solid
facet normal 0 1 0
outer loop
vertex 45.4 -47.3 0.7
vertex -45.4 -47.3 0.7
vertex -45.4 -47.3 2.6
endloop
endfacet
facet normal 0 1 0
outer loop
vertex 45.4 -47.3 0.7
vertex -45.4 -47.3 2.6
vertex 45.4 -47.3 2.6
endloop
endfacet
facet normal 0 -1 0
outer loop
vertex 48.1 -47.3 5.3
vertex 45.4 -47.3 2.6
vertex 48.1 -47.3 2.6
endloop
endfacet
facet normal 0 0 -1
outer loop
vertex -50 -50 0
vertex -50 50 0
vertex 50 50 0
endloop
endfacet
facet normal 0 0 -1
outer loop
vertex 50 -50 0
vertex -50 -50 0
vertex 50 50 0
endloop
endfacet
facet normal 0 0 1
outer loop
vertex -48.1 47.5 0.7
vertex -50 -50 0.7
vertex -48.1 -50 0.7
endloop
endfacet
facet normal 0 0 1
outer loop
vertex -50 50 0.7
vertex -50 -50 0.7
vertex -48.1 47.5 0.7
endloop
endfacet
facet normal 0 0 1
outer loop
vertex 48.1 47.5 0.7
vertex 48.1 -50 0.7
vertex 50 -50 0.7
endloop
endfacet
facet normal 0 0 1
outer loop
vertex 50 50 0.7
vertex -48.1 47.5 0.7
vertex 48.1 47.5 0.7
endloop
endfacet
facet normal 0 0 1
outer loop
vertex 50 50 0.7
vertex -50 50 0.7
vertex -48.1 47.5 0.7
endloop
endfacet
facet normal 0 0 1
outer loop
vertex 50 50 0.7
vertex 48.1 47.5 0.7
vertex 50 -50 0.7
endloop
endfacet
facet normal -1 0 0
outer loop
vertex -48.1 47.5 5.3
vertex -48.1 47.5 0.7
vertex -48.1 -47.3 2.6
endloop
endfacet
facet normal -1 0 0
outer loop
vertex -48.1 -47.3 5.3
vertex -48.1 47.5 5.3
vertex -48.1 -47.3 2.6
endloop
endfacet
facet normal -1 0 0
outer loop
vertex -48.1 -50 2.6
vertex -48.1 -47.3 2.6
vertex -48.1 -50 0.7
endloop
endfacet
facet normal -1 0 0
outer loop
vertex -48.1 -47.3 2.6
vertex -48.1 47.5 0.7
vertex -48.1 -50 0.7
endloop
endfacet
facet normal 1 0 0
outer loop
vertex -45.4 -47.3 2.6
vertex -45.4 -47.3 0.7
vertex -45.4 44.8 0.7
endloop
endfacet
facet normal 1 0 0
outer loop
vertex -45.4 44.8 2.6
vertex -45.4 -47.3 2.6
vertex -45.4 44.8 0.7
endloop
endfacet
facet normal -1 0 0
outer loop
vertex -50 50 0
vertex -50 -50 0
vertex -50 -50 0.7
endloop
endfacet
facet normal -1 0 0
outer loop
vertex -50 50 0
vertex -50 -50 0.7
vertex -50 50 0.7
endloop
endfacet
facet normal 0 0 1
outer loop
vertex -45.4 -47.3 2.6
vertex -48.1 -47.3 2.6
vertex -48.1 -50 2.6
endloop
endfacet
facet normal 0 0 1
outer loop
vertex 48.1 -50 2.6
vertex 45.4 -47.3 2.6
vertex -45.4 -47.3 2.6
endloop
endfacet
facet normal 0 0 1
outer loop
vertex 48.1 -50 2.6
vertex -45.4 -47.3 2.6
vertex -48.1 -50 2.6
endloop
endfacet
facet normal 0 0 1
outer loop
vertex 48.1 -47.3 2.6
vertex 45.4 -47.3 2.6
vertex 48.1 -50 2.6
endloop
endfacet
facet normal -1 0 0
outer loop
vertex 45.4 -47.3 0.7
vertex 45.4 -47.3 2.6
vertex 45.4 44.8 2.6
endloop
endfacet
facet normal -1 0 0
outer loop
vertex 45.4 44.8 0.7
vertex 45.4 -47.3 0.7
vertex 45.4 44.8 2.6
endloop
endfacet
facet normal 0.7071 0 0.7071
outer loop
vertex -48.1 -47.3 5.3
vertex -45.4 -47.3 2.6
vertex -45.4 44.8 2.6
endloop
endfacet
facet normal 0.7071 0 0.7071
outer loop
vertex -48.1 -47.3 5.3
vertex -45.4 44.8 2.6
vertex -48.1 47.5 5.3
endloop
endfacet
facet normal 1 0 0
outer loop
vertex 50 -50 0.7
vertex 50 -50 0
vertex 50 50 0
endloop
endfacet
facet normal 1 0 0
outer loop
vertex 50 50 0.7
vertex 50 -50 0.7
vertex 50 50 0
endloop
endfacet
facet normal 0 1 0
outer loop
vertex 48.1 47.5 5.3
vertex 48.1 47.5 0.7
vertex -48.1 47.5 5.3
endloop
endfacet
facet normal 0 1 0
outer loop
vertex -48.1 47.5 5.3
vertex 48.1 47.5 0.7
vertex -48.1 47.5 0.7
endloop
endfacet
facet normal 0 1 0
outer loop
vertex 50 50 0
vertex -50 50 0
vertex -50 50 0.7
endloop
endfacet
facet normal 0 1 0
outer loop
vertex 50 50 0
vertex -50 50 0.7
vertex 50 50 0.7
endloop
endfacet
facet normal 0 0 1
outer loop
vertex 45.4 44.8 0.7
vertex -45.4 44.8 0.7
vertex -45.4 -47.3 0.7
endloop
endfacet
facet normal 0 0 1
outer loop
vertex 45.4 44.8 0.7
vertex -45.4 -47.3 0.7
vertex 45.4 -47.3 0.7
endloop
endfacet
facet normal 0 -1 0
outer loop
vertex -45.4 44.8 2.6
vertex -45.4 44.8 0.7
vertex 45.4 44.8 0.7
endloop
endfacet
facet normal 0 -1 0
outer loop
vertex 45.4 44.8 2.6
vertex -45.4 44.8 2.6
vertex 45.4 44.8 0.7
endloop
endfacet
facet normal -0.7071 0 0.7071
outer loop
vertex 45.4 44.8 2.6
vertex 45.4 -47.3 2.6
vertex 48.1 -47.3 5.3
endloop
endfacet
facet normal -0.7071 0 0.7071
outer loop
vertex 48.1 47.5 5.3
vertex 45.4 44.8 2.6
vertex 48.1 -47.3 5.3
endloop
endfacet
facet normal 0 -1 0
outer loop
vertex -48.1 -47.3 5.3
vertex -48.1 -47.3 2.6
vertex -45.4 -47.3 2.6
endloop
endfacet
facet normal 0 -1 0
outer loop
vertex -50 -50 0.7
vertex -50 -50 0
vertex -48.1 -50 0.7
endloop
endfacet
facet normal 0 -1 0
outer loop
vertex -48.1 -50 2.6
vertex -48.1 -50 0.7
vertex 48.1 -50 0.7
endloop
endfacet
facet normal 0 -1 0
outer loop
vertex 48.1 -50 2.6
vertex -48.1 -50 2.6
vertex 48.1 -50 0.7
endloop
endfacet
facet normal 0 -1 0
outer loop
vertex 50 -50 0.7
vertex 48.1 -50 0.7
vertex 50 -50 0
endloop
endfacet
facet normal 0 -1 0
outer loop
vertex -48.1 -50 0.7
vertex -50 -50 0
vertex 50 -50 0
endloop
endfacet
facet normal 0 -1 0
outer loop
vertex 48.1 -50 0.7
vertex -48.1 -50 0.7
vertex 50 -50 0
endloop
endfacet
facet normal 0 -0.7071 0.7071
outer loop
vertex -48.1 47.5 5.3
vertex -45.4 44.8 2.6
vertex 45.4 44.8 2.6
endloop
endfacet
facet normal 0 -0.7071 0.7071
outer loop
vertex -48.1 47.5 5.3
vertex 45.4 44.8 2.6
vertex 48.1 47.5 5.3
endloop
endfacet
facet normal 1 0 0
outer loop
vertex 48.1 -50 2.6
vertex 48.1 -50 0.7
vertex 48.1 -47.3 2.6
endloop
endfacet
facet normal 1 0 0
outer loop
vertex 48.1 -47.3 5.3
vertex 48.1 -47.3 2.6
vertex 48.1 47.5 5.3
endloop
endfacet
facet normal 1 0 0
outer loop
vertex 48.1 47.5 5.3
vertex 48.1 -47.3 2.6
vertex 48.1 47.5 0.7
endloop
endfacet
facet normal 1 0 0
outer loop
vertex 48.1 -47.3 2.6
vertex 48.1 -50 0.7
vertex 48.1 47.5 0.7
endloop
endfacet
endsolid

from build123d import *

# Parameters (mm, degrees)
F0_W         = 100
F0_H         = 100
F1_DEPTH     = 0.7
F2_W         = 96.2
F2_H         = 97.5
F2_W_2       = 90.8
F2_H_2       = 92.1
F3_DEPTH     = 1.9
F5_DEPTH     = 3
F6_T1_DEPTH  = 90.8
F6_T3_DEPTH  = 99.8150489639
F6_T9_DEPTH  = 99.8150489639
F6_T15_DEPTH = 98.5150489639
F6_T24_DEPTH = 99.8150489639
F6_T30_DEPTH = 98.5150489639


# Not quite as in the source:
# - a fillet or chamfer that OpenCascade refuses, or shapes differently, is made with other operations: its cross-section is extruded or revolved along the edge and cut away or added


with BuildPart() as f1:
    # F0 (on Top) → F1 (new body)
    with BuildSketch(Plane.XY):
        Rectangle(F0_W, F0_H)
    extrude(amount=F1_DEPTH)

    # F2 (on face) → F3 (join)
    with BuildSketch(Plane.XY.offset(0.7)):
        with Locations((0, -1.25)):
            Rectangle(F2_W, F2_H)
        with Locations((0, -1.25)):
            Rectangle(F2_W_2, F2_H_2, mode=Mode.SUBTRACT)
    extrude(amount=F3_DEPTH)

    # F4 (on face) → F5 (join)
    with BuildSketch(Plane.XY.offset(2.6)):
        Polygon((-48.1, -47.3), (-45.4, -47.3), (-45.4, 44.8), (45.4, 44.8), (45.4, -47.3), (48.1, -47.3), (48.1, 47.5), (-48.1, 47.5), align=None)
    extrude(amount=F5_DEPTH)

    # F6: chamfer of 3 on 3 edges, made by hand

    # F6_s2 → F6_t1 (cut)
    with BuildSketch(Plane.YZ.offset(-45.4)):
        Polygon((44.8, 2.6), (47.8, 5.6), (44.8, 5.6), align=None)
    extrude(amount=F6_T1_DEPTH, mode=Mode.SUBTRACT)

    # F6_s4 → F6_t3 (cut)
    with BuildSketch(Plane.XZ.offset(-44.8)):
        Polygon((-45.4, 2.6), (-48.4, 5.6), (-45.4, 5.6), align=None)
        Polygon((45.4, 2.6), (48.4, 5.6), (45.4, 5.6), align=None)
    extrude(amount=F6_T3_DEPTH, mode=Mode.SUBTRACT)


with BuildPart() as f6_tool7:
    # F6_s8 → F6_t9 (new body)
    with BuildSketch(Plane.XZ.offset(47.3)):
        Polygon((-45.4, 2.6), (-48.4, 5.6), (-45.4, 5.6), align=None)
    extrude(amount=-F6_T9_DEPTH)

    split(bisect_by=Plane.YZ.offset(-48.1), keep=Keep.TOP)

    split(bisect_by=Plane.XZ.offset(-44.8), keep=Keep.BOTTOM)

    split(bisect_by=Plane.XZ.offset(-47.5), keep=Keep.TOP)


with BuildPart() as f6_tool13:
    # F6_s14 → F6_t15 (new body)
    with BuildSketch(Plane.YZ.offset(-53.1150489639)):
        Polygon((44.8, 2.6), (47.8, 5.6), (44.8, 5.6), align=None)
    extrude(amount=F6_T15_DEPTH)

    split(bisect_by=Plane.YZ.offset(-48.1), keep=Keep.TOP)

    split(bisect_by=Plane.YZ.offset(-45.4), keep=Keep.BOTTOM)

    split(bisect_by=Plane.XZ.offset(-47.5), keep=Keep.TOP)


with BuildPart() as f6_tool7_1:
    add(f6_tool7.part)

    # F6_t19: intersect F6_tool13
    add(f6_tool13.part, mode=Mode.INTERSECT)


with BuildPart() as f1_1:
    add(f1.part)

    # F6_t5: cut F6_tool7
    add(f6_tool7_1.part, mode=Mode.SUBTRACT)


with BuildPart() as f6_tool22:
    # F6_s23 → F6_t24 (new body)
    with BuildSketch(Plane.XZ.offset(-52.5150489639)):
        Polygon((45.4, 2.6), (48.4, 5.6), (45.4, 5.6), align=None)
    extrude(amount=F6_T24_DEPTH)

    split(bisect_by=Plane.XZ.offset(-44.8), keep=Keep.BOTTOM)

    split(bisect_by=Plane.XZ.offset(-47.5), keep=Keep.TOP)

    split(bisect_by=Plane.YZ.offset(48.1), keep=Keep.BOTTOM)


with BuildPart() as f6_tool28:
    # F6_s29 → F6_t30 (new body)
    with BuildSketch(Plane.YZ.offset(-45.4)):
        Polygon((44.8, 2.6), (47.8, 5.6), (44.8, 5.6), align=None)
    extrude(amount=F6_T30_DEPTH)

    split(bisect_by=Plane.YZ.offset(45.4), keep=Keep.TOP)

    split(bisect_by=Plane.XZ.offset(-47.5), keep=Keep.TOP)

    split(bisect_by=Plane.YZ.offset(48.1), keep=Keep.BOTTOM)


with BuildPart() as f6_tool22_1:
    add(f6_tool22.part)

    # F6_t34: intersect F6_tool28
    add(f6_tool28.part, mode=Mode.INTERSECT)


with BuildPart() as f1_2:
    add(f1_1.part)

    # F6_t20: cut F6_tool22
    add(f6_tool22_1.part, mode=Mode.SUBTRACT)


solid = f1_2.part
